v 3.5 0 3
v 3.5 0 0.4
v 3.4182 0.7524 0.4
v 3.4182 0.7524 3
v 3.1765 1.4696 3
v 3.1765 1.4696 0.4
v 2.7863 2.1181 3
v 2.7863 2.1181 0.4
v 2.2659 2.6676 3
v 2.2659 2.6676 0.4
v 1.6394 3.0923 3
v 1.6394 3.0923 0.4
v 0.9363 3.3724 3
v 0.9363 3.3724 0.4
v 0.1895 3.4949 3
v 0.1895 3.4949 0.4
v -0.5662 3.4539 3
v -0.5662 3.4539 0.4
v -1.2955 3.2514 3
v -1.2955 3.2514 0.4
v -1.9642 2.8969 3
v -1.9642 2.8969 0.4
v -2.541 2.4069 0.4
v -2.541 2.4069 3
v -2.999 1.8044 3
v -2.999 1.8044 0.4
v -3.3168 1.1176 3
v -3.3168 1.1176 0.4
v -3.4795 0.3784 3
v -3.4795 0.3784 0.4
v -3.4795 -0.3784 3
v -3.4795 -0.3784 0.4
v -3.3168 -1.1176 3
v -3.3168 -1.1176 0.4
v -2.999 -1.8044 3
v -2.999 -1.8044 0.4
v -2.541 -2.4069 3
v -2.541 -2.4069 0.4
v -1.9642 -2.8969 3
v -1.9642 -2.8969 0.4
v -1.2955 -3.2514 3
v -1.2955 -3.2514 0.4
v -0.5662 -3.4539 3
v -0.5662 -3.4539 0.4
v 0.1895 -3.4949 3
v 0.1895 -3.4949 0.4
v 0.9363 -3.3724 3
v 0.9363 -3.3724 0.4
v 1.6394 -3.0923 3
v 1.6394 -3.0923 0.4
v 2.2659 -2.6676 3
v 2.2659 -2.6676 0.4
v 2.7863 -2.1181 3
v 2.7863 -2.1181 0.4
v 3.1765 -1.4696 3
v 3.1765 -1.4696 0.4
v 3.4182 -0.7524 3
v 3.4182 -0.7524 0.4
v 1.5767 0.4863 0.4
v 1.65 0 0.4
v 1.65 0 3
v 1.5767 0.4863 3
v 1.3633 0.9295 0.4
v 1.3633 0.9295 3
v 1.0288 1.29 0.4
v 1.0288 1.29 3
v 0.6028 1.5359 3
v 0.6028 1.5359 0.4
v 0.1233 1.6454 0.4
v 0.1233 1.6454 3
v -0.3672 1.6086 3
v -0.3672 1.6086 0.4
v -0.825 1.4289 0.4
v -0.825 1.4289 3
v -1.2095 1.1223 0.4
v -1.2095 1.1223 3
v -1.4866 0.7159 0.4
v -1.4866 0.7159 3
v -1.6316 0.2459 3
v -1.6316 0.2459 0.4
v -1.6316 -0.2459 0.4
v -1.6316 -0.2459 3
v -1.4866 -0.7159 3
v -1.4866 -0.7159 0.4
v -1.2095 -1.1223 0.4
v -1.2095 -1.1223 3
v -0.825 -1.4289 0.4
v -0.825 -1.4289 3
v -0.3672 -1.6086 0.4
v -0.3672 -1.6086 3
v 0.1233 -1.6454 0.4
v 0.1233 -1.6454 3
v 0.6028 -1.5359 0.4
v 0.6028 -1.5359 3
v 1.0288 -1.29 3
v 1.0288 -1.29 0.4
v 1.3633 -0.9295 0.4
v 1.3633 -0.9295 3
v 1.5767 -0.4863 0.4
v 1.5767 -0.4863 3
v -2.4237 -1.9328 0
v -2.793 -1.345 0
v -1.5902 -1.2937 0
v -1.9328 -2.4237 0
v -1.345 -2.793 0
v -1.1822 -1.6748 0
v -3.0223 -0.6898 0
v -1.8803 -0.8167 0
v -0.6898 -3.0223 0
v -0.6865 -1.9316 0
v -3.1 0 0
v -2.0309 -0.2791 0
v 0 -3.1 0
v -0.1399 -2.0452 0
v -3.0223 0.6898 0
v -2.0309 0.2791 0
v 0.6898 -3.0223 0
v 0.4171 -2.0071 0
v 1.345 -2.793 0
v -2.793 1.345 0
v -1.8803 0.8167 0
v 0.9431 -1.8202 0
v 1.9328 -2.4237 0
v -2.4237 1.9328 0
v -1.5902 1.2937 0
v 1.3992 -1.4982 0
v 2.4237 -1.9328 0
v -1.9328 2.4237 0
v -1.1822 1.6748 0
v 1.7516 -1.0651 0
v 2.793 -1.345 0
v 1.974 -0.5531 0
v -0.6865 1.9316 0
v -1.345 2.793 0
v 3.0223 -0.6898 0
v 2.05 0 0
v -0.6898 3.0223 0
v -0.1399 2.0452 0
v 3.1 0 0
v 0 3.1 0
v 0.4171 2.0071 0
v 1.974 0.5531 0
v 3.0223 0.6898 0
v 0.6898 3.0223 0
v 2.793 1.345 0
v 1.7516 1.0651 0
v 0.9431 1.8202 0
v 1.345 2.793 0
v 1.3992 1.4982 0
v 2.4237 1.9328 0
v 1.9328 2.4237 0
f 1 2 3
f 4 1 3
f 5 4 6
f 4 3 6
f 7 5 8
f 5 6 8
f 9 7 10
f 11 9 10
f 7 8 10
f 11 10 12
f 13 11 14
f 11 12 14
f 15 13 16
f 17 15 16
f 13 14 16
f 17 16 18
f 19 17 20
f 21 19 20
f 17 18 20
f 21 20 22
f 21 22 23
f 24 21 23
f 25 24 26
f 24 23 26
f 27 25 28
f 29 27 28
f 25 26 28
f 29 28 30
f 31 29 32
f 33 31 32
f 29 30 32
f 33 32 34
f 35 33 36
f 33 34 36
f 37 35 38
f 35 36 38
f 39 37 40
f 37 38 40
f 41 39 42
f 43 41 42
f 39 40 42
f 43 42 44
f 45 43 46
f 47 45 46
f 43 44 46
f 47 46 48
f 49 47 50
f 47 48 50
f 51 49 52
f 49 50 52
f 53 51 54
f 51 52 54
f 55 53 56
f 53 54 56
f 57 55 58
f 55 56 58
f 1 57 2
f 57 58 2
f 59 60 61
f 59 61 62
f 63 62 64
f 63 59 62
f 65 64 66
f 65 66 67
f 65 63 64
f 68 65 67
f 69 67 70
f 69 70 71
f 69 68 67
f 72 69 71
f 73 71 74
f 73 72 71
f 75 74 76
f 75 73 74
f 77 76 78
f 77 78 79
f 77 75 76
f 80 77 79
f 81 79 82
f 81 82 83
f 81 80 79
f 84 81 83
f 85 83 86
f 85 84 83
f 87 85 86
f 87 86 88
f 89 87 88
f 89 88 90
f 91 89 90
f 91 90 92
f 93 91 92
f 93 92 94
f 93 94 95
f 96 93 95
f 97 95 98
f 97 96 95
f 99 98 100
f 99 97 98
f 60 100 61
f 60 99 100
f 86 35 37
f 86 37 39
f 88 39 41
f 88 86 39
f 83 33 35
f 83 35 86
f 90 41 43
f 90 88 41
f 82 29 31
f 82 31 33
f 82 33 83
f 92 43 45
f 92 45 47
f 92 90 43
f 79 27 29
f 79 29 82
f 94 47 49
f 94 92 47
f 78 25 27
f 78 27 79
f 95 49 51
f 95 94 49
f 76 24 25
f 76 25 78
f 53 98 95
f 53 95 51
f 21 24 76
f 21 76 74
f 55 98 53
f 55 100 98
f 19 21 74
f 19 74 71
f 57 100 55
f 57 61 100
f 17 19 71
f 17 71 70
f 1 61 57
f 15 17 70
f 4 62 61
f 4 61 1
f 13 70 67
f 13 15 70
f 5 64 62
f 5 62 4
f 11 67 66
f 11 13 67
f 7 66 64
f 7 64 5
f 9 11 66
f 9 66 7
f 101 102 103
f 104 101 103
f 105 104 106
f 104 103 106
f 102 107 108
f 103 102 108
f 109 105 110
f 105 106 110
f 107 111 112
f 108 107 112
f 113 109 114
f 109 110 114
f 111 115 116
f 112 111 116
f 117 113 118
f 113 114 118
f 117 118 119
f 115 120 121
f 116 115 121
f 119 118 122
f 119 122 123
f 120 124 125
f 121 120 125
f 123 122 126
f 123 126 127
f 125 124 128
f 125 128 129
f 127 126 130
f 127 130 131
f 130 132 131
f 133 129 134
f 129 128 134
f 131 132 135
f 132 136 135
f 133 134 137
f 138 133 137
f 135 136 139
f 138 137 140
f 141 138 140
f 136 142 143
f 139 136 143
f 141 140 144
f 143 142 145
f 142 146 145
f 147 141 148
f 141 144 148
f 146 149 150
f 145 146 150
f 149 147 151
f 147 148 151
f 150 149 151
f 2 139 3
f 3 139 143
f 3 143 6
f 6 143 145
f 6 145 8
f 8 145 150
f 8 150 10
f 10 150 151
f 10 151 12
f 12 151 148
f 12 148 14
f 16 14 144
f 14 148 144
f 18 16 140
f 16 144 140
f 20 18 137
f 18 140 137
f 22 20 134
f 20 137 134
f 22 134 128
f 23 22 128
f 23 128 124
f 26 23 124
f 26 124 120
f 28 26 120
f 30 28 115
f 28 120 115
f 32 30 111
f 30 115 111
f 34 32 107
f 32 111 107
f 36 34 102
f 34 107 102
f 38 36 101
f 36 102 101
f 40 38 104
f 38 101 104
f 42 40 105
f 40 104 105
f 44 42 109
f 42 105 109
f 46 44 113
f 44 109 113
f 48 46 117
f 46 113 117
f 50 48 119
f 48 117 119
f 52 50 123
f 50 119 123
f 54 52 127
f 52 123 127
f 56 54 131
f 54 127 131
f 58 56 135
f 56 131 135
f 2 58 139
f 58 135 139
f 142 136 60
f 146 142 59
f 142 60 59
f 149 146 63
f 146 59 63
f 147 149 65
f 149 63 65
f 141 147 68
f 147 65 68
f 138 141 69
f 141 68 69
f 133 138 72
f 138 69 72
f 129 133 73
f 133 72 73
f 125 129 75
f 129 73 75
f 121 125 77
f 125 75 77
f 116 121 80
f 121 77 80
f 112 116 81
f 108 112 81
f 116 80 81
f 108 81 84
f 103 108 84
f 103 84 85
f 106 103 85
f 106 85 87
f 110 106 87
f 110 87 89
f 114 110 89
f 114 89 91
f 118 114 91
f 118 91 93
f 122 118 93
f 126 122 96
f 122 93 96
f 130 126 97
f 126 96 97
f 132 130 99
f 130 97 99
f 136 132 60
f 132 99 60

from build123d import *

# Parameters (mm, degrees)
CYLINDER001_R     = 1.65
CYLINDER001_DEPTH = 3
CYLINDER_R        = 3.5
CYLINDER_DEPTH    = 3
CHAMFER001_SIZE   = 0.4


with BuildPart() as cylinder001:
    # Cylinder001 → Cylinder001 (new body)
    with BuildSketch(Plane.XY):
        Circle(CYLINDER001_R)
    extrude(amount=CYLINDER001_DEPTH)


with BuildPart() as chamfer001:
    # Cylinder → Cylinder (new body)
    with BuildSketch(Plane.XY):
        Circle(CYLINDER_R)
    extrude(amount=CYLINDER_DEPTH)

    # Cut: cut Cylinder001
    add(cylinder001.part, mode=Mode.SUBTRACT)

    # Chamfer001
    chamfer001_edges = [chamfer001.edges().sort_by_distance(p)[0] for p in [
        (-3.5, 0, 0),
        (-1.65, 0, 0),
    ]]
    chamfer(chamfer001_edges, length=CHAMFER001_SIZE)


solid = chamfer001.part
